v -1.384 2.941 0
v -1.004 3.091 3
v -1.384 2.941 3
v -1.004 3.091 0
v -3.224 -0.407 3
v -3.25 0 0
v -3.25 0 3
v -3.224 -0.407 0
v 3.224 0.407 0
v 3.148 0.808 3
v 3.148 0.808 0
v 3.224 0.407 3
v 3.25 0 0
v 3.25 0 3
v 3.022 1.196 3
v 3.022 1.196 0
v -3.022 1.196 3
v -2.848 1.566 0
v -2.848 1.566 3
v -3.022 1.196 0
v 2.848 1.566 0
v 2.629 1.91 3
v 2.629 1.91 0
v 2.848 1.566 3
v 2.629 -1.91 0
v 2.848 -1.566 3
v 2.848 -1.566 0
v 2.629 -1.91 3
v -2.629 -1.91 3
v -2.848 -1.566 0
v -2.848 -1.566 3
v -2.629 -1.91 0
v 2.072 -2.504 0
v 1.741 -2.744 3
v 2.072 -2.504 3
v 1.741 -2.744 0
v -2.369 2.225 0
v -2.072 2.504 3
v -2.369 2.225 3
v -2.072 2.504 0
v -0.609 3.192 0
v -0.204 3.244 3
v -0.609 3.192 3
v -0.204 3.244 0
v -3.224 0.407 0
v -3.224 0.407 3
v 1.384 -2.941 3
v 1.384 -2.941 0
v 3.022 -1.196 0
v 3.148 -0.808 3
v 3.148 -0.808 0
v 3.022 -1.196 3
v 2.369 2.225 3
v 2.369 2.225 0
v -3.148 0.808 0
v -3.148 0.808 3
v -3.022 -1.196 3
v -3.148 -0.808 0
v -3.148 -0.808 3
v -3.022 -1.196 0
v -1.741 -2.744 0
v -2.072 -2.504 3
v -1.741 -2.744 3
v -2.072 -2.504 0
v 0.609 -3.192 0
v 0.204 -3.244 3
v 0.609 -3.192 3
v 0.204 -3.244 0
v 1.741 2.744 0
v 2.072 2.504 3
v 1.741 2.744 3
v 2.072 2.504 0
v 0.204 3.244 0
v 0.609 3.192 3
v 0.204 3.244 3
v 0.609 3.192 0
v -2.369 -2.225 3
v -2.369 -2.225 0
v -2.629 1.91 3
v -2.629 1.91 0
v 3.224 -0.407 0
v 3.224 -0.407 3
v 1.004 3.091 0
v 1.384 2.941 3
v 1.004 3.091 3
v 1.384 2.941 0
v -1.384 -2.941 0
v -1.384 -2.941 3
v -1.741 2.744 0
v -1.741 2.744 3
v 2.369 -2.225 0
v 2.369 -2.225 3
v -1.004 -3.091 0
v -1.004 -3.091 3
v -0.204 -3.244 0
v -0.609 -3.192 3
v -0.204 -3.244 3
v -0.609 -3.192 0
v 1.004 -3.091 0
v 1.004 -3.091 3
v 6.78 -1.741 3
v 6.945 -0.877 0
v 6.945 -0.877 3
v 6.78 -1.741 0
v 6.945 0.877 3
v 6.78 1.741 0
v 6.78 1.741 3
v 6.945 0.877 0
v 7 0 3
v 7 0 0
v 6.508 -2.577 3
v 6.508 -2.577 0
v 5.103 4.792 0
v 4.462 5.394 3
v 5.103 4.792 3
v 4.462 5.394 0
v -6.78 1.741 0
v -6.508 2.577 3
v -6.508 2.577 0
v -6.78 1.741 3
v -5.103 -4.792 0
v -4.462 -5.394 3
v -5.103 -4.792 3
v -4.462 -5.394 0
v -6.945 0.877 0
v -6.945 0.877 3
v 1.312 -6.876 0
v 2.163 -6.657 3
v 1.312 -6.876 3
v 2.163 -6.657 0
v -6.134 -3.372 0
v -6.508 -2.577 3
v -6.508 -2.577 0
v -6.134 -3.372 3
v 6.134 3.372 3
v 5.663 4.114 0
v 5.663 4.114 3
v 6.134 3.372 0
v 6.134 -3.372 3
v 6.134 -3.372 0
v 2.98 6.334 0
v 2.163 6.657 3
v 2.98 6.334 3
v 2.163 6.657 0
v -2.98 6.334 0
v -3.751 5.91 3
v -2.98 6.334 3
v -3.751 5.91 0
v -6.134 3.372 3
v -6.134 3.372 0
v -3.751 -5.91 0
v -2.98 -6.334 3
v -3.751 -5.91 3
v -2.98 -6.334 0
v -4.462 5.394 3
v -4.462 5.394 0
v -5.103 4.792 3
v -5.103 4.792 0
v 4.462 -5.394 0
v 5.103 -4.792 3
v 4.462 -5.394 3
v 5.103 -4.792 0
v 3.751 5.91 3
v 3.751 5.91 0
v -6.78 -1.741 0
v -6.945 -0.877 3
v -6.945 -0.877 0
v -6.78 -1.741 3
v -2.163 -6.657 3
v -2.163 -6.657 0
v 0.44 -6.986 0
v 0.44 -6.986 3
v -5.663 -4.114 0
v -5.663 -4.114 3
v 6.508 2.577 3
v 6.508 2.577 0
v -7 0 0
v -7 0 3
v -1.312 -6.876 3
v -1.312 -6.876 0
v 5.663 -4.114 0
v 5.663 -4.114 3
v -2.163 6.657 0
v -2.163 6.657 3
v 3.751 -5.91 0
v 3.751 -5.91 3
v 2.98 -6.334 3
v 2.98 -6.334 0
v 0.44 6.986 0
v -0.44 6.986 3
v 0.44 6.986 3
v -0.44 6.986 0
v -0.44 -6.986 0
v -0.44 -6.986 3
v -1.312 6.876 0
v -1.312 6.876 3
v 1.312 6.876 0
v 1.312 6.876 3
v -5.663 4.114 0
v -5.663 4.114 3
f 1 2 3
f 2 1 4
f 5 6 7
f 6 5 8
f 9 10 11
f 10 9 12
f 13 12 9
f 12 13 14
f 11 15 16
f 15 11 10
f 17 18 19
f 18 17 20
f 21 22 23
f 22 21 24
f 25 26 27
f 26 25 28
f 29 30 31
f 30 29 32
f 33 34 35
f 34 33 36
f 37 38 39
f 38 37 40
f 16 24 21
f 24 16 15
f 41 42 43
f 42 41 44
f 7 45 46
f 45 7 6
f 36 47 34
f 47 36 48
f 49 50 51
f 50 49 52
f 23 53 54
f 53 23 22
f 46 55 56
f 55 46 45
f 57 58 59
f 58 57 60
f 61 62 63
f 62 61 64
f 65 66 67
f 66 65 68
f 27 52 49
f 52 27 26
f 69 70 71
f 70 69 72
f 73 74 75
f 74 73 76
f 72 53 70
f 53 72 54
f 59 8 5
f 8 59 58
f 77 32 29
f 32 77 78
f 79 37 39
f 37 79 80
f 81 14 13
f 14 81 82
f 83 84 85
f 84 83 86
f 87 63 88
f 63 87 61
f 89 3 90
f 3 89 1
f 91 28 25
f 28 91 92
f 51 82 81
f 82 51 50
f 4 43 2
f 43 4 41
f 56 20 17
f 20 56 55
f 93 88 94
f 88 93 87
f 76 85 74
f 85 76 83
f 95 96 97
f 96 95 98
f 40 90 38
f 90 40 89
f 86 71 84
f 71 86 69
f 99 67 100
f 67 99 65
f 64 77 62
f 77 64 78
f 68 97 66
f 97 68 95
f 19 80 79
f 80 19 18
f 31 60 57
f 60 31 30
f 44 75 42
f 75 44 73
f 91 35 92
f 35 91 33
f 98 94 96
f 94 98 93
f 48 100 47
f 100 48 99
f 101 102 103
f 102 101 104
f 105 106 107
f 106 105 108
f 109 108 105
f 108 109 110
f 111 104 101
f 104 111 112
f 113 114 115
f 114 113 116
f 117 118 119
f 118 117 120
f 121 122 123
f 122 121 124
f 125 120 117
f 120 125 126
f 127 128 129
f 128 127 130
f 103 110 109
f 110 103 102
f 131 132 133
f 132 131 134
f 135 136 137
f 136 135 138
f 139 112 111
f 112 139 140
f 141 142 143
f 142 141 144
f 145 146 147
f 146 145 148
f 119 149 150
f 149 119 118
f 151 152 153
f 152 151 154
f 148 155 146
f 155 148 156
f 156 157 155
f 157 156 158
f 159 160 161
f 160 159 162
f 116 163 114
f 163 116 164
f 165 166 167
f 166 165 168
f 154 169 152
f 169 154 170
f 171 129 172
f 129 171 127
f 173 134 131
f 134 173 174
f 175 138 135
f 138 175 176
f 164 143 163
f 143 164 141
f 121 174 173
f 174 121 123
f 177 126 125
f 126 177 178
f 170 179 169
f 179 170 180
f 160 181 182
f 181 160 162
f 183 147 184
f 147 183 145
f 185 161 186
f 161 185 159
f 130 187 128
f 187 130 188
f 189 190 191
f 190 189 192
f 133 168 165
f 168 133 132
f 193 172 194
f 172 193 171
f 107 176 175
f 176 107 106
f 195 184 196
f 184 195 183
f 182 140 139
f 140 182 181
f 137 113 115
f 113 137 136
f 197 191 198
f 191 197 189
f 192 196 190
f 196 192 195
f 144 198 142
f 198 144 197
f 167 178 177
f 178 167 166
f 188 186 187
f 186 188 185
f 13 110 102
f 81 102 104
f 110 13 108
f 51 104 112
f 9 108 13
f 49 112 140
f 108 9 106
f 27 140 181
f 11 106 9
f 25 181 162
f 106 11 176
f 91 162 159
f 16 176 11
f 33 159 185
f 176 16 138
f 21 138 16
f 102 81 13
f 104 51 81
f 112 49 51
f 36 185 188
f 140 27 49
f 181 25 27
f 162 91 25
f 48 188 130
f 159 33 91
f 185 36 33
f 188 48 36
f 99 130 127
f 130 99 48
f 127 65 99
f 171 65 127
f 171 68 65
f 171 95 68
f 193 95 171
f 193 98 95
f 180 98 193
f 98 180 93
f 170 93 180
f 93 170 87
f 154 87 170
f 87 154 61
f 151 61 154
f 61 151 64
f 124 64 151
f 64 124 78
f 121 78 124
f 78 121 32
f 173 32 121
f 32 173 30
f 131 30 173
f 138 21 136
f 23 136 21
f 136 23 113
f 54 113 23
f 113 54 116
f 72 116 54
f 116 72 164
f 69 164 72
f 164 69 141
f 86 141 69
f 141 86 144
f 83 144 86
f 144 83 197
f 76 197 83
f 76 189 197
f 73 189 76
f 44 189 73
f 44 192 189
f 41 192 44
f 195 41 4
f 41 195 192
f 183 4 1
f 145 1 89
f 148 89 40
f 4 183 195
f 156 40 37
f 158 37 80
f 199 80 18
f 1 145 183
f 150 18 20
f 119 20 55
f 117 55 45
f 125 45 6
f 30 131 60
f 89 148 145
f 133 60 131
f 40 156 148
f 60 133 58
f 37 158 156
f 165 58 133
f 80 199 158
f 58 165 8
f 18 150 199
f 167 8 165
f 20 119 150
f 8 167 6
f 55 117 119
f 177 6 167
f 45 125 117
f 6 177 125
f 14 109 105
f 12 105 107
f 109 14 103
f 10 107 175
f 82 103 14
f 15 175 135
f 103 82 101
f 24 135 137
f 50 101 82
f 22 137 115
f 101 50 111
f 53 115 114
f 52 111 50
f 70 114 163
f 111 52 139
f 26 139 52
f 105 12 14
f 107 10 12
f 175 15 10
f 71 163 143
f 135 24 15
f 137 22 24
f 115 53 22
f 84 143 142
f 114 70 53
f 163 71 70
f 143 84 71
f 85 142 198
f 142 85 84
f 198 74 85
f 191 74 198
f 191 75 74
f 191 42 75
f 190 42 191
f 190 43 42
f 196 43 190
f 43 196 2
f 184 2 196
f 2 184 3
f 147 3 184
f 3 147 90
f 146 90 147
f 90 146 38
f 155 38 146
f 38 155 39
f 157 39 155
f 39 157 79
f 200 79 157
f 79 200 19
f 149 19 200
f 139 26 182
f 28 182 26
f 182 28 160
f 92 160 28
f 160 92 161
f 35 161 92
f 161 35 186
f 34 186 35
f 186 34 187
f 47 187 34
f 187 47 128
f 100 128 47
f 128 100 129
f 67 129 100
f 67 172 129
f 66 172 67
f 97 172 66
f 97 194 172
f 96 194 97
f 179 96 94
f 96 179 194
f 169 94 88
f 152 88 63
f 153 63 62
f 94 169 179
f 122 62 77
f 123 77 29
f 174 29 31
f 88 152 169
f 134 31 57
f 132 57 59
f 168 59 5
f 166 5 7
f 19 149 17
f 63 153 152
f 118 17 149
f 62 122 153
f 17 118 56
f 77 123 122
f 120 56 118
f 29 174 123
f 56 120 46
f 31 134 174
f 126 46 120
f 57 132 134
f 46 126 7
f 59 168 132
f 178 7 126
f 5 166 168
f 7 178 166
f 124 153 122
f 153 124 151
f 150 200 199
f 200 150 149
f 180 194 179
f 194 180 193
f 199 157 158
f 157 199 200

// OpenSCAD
$fn = 50;

difference() {
	union() {
		cylinder(h = 3, r = 7.0);
	}
	union() {
		translate(v = [0.0, 0.0, -100.0]) {
			cylinder(h = 200, r = 3.25);
		}
		translate(v = [0.0, 0.0, -100.0]) {
			cylinder(h = 200, r = 1.8);
		}
		cylinder(h = 3, r = 2.0);
	}
}
